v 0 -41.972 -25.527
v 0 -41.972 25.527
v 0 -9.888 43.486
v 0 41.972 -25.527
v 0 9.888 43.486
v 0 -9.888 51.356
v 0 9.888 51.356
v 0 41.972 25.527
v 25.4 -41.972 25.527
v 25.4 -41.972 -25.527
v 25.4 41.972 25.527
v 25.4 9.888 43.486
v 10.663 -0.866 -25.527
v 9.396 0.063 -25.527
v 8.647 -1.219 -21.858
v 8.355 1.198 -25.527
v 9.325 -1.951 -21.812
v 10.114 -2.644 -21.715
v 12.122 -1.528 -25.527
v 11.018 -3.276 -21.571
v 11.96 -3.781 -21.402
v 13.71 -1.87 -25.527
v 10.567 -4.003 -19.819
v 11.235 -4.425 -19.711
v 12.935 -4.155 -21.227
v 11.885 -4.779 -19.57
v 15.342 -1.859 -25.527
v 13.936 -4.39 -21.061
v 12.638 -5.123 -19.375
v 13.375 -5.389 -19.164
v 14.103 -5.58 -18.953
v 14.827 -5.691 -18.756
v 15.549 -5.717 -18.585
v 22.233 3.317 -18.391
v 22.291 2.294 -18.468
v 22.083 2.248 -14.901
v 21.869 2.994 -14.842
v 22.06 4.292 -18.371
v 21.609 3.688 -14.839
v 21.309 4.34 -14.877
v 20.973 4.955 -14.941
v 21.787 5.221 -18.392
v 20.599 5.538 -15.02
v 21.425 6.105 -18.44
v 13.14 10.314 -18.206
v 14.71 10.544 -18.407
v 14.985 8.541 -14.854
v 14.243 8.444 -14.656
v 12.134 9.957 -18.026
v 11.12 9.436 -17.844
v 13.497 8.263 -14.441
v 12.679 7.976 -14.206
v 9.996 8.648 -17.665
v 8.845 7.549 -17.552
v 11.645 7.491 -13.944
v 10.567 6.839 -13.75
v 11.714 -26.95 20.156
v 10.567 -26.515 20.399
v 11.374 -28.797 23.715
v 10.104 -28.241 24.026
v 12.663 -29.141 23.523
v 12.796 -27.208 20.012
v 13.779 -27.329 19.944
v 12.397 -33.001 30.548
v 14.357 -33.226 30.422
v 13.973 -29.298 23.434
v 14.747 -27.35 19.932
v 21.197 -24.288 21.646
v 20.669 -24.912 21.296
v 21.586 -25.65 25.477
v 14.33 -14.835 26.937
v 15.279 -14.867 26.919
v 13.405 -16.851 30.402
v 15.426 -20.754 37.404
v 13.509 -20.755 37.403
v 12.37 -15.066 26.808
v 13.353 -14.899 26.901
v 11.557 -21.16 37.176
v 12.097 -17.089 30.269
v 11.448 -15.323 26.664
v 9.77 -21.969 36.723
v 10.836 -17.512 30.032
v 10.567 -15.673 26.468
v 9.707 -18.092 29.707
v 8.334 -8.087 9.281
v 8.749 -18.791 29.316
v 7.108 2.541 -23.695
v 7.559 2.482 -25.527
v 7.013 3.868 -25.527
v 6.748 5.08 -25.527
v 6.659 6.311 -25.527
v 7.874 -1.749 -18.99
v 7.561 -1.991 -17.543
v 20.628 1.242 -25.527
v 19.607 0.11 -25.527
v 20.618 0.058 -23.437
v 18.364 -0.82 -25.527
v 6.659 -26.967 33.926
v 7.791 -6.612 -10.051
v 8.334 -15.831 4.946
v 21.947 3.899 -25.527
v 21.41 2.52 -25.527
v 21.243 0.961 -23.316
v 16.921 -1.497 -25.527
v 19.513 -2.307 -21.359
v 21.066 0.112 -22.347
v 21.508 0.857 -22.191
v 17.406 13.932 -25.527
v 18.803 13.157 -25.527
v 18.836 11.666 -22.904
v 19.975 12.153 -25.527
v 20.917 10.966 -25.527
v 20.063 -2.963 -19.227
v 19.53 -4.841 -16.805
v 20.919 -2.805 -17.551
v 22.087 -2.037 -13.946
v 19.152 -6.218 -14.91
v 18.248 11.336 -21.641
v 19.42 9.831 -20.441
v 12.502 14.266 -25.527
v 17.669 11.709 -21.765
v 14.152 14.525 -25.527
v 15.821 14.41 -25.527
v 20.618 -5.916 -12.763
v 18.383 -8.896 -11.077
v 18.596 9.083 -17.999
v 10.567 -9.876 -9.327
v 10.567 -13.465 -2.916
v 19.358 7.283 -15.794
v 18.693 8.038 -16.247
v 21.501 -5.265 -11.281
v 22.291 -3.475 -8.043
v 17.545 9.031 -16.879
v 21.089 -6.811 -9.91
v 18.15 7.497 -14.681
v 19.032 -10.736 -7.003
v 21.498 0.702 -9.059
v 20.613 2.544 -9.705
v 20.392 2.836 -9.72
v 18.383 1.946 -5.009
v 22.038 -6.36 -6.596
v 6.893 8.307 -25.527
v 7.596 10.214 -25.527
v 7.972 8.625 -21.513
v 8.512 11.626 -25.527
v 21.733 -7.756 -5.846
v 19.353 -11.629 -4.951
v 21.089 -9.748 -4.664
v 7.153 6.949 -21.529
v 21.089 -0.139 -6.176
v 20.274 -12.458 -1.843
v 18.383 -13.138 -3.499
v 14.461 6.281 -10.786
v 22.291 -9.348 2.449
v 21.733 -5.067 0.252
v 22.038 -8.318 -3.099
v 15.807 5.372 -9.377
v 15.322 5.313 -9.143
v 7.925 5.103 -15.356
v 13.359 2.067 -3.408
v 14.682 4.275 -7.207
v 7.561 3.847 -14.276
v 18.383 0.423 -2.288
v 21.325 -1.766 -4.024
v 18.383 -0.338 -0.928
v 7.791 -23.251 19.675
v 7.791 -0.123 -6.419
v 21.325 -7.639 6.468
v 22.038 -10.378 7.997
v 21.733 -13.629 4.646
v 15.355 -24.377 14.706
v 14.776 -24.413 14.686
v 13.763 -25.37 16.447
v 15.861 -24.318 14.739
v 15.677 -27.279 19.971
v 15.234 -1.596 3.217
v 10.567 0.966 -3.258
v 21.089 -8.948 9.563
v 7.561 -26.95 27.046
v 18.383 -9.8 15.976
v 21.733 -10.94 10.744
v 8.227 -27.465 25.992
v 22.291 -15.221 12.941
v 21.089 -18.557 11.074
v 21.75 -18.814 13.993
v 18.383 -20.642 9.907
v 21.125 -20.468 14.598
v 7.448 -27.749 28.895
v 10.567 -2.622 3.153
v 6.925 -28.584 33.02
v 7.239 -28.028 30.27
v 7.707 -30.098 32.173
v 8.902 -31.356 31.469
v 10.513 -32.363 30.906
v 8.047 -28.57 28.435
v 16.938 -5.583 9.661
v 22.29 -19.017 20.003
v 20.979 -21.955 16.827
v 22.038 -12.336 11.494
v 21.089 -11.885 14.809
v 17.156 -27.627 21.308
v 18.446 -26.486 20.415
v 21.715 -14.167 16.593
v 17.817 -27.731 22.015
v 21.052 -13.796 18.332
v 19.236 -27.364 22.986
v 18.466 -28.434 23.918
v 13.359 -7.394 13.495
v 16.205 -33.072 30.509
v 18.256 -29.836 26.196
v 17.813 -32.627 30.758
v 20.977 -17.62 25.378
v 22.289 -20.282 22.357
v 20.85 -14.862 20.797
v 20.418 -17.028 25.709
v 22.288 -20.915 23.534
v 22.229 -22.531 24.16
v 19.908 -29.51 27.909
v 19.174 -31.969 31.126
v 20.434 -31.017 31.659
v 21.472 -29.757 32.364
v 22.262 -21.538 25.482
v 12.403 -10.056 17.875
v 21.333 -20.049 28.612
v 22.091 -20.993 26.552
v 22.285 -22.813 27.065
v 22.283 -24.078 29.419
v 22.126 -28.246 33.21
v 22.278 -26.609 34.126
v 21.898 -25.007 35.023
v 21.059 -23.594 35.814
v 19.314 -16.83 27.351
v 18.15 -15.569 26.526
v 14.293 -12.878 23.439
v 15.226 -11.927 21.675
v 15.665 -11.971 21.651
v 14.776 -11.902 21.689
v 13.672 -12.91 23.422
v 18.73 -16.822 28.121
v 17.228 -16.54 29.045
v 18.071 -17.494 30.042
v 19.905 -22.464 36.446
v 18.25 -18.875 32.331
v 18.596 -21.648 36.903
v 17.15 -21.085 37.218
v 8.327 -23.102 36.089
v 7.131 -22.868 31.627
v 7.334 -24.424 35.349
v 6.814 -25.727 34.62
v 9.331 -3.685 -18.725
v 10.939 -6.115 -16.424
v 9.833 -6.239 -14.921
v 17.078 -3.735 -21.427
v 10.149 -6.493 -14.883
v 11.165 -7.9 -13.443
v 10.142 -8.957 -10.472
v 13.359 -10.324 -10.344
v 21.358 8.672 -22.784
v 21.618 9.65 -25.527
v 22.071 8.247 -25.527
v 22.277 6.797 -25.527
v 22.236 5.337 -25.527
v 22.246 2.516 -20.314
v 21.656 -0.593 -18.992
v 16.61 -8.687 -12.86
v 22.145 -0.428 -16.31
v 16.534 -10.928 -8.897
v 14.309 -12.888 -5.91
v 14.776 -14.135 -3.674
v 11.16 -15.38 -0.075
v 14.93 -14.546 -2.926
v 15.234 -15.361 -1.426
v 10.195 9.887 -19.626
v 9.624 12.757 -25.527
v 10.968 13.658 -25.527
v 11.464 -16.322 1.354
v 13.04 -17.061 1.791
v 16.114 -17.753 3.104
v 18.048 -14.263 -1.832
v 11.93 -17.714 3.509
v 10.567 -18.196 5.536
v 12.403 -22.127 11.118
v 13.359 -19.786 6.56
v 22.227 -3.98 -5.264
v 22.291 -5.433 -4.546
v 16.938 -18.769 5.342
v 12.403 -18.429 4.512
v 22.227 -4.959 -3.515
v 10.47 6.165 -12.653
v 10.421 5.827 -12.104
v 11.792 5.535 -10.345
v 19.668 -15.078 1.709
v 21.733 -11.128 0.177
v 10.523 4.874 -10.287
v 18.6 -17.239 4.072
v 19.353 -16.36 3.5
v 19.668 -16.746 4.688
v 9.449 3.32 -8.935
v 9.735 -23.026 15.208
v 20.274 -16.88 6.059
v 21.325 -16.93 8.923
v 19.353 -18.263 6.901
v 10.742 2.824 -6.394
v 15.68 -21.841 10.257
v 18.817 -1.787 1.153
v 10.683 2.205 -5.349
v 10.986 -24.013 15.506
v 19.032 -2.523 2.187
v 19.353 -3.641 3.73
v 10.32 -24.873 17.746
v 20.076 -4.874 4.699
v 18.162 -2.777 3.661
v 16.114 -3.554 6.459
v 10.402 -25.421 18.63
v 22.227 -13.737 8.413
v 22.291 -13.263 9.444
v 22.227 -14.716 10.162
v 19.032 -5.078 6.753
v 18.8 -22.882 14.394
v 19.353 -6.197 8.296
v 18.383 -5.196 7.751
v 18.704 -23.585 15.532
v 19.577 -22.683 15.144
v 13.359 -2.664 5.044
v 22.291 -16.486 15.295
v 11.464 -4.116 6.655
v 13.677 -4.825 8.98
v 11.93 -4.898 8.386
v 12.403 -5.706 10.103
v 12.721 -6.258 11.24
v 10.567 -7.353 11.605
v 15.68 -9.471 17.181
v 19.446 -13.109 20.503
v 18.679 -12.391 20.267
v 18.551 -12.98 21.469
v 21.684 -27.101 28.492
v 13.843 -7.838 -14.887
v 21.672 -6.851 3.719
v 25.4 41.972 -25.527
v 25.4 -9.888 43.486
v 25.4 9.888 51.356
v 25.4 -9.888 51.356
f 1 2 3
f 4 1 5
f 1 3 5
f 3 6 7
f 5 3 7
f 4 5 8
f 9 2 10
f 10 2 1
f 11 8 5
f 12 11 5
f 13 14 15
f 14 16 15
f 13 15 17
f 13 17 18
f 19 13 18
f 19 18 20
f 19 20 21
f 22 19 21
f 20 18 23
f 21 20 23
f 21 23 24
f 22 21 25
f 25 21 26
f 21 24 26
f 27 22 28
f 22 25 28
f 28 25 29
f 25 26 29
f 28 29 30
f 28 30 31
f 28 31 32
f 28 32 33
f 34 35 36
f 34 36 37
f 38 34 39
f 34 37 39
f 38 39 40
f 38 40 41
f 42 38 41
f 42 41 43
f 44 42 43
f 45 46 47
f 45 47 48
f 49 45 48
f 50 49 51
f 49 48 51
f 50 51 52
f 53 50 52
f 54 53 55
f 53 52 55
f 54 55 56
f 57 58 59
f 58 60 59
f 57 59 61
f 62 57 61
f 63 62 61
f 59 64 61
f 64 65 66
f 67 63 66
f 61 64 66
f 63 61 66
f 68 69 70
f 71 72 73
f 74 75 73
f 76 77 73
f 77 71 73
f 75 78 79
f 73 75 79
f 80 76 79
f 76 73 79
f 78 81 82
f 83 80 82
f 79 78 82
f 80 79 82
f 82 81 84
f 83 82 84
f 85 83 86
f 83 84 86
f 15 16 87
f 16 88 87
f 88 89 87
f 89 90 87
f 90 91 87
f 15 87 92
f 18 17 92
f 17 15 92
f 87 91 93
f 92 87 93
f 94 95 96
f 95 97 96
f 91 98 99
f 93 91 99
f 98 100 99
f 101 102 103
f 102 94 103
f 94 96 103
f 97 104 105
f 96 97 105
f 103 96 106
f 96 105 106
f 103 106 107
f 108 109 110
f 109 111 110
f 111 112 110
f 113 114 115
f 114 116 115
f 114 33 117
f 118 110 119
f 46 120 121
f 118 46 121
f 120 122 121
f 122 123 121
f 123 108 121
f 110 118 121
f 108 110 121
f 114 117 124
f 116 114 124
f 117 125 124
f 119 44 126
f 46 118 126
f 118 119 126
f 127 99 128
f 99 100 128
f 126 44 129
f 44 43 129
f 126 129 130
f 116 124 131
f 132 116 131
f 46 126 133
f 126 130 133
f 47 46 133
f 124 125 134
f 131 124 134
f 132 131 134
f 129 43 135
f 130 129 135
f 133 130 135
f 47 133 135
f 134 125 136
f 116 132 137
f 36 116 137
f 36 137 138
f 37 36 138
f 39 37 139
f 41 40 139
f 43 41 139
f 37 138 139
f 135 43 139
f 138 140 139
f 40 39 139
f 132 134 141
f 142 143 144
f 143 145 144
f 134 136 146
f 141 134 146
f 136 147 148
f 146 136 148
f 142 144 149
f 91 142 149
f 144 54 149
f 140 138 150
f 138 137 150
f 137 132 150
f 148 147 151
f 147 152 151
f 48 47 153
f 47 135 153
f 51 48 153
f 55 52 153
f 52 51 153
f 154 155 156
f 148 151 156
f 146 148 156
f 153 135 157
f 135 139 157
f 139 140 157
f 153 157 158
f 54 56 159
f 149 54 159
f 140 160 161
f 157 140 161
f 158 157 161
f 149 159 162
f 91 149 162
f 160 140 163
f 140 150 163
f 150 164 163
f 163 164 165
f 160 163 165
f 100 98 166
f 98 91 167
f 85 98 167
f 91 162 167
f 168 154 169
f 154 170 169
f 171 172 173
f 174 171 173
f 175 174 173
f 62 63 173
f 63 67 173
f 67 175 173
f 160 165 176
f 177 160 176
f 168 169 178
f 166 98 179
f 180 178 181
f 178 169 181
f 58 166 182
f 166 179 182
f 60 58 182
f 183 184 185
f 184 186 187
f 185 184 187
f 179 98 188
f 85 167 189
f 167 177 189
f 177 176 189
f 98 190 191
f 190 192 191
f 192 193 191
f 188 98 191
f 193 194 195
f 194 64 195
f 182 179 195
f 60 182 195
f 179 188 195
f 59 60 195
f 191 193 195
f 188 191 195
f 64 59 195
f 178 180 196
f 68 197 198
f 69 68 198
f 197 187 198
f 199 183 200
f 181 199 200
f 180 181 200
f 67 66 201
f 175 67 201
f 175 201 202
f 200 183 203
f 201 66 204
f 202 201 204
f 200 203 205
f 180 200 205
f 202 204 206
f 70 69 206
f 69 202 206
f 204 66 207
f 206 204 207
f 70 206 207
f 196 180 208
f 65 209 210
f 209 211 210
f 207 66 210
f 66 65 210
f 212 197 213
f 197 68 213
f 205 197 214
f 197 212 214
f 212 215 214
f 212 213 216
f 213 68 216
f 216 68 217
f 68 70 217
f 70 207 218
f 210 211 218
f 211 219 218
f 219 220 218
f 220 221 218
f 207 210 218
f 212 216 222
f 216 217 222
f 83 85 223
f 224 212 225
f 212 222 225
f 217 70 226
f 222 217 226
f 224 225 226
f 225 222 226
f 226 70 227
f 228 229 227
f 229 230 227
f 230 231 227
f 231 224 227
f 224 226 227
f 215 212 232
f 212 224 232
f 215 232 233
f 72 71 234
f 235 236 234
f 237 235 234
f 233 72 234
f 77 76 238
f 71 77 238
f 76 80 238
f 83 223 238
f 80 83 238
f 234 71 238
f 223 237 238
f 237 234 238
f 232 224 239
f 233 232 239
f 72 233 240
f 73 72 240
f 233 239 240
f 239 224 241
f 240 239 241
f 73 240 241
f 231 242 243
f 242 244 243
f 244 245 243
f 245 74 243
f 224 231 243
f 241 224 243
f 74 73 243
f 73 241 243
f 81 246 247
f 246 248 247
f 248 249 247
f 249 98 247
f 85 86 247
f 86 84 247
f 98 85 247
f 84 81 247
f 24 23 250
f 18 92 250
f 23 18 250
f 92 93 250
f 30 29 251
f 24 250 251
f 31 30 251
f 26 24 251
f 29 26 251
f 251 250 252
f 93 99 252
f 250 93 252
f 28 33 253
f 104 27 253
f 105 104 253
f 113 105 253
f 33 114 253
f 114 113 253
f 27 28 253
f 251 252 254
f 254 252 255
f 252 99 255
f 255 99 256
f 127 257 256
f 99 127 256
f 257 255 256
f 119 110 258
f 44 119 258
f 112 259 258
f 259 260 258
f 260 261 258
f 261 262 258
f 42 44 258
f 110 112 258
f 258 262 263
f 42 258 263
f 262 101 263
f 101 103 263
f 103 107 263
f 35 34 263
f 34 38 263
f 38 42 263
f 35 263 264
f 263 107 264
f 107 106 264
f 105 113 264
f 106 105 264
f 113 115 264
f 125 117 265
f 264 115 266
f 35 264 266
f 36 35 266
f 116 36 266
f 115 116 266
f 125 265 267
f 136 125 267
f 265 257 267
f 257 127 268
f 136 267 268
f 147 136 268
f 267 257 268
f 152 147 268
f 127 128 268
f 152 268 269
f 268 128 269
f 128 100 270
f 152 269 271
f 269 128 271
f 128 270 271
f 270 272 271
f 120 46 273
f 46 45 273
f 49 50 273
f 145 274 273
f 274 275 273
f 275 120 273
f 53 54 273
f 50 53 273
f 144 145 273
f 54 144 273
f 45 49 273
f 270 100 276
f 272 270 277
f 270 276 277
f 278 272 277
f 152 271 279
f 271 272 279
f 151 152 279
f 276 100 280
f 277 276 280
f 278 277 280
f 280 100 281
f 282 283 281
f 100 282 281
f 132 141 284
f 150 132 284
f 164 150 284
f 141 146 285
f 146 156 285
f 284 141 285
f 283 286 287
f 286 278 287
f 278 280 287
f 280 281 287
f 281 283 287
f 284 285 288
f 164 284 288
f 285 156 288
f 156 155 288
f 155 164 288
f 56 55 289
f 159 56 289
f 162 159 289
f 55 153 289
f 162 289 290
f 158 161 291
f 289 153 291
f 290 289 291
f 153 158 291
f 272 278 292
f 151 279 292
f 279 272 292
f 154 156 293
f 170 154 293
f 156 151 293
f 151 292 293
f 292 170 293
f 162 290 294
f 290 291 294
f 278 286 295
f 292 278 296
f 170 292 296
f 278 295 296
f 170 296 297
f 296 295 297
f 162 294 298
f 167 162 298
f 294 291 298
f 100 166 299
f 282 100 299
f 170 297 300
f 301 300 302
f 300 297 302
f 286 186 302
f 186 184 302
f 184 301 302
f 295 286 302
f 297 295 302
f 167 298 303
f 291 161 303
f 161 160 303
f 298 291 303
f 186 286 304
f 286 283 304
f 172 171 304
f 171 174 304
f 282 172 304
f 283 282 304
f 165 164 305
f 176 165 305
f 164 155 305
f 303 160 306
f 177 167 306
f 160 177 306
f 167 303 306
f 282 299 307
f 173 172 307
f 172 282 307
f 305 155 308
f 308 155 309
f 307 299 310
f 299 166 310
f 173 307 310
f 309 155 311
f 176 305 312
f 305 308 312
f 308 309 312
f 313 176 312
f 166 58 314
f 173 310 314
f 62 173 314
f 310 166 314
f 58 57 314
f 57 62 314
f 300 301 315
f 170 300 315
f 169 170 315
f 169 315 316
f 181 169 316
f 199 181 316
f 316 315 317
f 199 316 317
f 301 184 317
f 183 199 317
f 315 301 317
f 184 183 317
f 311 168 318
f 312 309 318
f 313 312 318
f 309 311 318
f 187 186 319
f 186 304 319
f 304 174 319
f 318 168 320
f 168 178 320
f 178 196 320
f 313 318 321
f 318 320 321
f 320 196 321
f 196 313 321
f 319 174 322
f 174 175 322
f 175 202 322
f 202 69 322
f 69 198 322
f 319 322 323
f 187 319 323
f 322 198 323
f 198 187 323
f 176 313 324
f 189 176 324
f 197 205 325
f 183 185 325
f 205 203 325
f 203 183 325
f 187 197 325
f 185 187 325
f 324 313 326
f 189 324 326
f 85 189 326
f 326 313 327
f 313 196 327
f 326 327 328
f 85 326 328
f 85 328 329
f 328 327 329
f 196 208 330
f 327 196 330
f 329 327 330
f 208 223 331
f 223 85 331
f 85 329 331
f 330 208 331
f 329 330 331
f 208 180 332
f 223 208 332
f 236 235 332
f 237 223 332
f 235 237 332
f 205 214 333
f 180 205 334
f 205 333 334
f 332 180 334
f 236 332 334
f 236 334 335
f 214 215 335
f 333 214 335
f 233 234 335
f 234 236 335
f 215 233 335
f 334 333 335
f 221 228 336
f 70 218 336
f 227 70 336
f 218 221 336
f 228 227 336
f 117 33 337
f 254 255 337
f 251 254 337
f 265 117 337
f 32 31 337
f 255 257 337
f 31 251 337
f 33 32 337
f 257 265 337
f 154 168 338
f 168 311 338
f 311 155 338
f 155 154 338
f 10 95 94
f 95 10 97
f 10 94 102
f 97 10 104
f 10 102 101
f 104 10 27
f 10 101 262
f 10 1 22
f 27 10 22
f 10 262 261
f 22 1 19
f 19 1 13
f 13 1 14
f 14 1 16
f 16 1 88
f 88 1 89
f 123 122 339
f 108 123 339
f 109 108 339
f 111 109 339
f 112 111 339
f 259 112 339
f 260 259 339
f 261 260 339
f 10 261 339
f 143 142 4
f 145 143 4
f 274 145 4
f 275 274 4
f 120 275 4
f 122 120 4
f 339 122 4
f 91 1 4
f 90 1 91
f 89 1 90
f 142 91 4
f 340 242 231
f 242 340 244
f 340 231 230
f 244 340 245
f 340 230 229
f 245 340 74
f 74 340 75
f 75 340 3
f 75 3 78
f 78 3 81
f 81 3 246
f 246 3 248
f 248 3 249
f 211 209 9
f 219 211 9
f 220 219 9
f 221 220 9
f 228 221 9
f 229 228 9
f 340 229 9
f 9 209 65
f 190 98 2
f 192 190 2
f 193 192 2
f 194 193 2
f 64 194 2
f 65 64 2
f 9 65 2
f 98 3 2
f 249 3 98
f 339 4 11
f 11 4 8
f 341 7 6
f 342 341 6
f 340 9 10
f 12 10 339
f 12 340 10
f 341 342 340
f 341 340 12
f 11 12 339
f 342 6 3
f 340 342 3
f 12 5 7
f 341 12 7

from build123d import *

# Parameters (mm, degrees)
F1_DEPTH = 25.4
F3_DEPTH = 99.314


with BuildPart() as f1:
    # F0 (on Right) → F1 (new body)
    with BuildSketch(Plane.YZ):
        Polygon((0, 51.3557270169), (-9.88774281, 51.3557270169), (-9.88774281, 43.4858873487), (-41.9724583626, 25.5265198648), (-41.9724583626, -25.5265198648), (0, -25.5265198648), (41.9724583626, -25.5265198648), (41.9724583626, 25.5265198648), (9.88774281, 43.4858873487), (9.88774281, 51.3557270169), align=None)
    extrude(amount=F1_DEPTH)

    # F2 (on face) → F3 (cut)
    with BuildSketch(Plane(origin=(0, -20.8930053431, 37.3257094981), x_dir=(1, 0, 0), z_dir=(0, -0.4884362121, 0.8725996027))):
        with BuildLine():
            add(Edge.make_bspline(
                [(6.659491919, -6.9608236663), (6.659491919, -19.3859712045), (18.3831579052, -13.1733974354), (30.1068238914, -6.9608236663), (18.3831579052, -0.7482498972), (6.659491919, 5.4643238719), (6.659491919, -6.9608236663)],
                knots=[0, 0, 0, 2.0943951024, 2.0943951024, 4.1887902048, 4.1887902048, 6.2831853072, 6.2831853072, 6.2831853072], degree=2, weights=[1, 0.5, 1, 0.5, 1, 0.5, 1]))
        make_face()
    extrude(amount=-F3_DEPTH, mode=Mode.SUBTRACT)


solid = f1.part
